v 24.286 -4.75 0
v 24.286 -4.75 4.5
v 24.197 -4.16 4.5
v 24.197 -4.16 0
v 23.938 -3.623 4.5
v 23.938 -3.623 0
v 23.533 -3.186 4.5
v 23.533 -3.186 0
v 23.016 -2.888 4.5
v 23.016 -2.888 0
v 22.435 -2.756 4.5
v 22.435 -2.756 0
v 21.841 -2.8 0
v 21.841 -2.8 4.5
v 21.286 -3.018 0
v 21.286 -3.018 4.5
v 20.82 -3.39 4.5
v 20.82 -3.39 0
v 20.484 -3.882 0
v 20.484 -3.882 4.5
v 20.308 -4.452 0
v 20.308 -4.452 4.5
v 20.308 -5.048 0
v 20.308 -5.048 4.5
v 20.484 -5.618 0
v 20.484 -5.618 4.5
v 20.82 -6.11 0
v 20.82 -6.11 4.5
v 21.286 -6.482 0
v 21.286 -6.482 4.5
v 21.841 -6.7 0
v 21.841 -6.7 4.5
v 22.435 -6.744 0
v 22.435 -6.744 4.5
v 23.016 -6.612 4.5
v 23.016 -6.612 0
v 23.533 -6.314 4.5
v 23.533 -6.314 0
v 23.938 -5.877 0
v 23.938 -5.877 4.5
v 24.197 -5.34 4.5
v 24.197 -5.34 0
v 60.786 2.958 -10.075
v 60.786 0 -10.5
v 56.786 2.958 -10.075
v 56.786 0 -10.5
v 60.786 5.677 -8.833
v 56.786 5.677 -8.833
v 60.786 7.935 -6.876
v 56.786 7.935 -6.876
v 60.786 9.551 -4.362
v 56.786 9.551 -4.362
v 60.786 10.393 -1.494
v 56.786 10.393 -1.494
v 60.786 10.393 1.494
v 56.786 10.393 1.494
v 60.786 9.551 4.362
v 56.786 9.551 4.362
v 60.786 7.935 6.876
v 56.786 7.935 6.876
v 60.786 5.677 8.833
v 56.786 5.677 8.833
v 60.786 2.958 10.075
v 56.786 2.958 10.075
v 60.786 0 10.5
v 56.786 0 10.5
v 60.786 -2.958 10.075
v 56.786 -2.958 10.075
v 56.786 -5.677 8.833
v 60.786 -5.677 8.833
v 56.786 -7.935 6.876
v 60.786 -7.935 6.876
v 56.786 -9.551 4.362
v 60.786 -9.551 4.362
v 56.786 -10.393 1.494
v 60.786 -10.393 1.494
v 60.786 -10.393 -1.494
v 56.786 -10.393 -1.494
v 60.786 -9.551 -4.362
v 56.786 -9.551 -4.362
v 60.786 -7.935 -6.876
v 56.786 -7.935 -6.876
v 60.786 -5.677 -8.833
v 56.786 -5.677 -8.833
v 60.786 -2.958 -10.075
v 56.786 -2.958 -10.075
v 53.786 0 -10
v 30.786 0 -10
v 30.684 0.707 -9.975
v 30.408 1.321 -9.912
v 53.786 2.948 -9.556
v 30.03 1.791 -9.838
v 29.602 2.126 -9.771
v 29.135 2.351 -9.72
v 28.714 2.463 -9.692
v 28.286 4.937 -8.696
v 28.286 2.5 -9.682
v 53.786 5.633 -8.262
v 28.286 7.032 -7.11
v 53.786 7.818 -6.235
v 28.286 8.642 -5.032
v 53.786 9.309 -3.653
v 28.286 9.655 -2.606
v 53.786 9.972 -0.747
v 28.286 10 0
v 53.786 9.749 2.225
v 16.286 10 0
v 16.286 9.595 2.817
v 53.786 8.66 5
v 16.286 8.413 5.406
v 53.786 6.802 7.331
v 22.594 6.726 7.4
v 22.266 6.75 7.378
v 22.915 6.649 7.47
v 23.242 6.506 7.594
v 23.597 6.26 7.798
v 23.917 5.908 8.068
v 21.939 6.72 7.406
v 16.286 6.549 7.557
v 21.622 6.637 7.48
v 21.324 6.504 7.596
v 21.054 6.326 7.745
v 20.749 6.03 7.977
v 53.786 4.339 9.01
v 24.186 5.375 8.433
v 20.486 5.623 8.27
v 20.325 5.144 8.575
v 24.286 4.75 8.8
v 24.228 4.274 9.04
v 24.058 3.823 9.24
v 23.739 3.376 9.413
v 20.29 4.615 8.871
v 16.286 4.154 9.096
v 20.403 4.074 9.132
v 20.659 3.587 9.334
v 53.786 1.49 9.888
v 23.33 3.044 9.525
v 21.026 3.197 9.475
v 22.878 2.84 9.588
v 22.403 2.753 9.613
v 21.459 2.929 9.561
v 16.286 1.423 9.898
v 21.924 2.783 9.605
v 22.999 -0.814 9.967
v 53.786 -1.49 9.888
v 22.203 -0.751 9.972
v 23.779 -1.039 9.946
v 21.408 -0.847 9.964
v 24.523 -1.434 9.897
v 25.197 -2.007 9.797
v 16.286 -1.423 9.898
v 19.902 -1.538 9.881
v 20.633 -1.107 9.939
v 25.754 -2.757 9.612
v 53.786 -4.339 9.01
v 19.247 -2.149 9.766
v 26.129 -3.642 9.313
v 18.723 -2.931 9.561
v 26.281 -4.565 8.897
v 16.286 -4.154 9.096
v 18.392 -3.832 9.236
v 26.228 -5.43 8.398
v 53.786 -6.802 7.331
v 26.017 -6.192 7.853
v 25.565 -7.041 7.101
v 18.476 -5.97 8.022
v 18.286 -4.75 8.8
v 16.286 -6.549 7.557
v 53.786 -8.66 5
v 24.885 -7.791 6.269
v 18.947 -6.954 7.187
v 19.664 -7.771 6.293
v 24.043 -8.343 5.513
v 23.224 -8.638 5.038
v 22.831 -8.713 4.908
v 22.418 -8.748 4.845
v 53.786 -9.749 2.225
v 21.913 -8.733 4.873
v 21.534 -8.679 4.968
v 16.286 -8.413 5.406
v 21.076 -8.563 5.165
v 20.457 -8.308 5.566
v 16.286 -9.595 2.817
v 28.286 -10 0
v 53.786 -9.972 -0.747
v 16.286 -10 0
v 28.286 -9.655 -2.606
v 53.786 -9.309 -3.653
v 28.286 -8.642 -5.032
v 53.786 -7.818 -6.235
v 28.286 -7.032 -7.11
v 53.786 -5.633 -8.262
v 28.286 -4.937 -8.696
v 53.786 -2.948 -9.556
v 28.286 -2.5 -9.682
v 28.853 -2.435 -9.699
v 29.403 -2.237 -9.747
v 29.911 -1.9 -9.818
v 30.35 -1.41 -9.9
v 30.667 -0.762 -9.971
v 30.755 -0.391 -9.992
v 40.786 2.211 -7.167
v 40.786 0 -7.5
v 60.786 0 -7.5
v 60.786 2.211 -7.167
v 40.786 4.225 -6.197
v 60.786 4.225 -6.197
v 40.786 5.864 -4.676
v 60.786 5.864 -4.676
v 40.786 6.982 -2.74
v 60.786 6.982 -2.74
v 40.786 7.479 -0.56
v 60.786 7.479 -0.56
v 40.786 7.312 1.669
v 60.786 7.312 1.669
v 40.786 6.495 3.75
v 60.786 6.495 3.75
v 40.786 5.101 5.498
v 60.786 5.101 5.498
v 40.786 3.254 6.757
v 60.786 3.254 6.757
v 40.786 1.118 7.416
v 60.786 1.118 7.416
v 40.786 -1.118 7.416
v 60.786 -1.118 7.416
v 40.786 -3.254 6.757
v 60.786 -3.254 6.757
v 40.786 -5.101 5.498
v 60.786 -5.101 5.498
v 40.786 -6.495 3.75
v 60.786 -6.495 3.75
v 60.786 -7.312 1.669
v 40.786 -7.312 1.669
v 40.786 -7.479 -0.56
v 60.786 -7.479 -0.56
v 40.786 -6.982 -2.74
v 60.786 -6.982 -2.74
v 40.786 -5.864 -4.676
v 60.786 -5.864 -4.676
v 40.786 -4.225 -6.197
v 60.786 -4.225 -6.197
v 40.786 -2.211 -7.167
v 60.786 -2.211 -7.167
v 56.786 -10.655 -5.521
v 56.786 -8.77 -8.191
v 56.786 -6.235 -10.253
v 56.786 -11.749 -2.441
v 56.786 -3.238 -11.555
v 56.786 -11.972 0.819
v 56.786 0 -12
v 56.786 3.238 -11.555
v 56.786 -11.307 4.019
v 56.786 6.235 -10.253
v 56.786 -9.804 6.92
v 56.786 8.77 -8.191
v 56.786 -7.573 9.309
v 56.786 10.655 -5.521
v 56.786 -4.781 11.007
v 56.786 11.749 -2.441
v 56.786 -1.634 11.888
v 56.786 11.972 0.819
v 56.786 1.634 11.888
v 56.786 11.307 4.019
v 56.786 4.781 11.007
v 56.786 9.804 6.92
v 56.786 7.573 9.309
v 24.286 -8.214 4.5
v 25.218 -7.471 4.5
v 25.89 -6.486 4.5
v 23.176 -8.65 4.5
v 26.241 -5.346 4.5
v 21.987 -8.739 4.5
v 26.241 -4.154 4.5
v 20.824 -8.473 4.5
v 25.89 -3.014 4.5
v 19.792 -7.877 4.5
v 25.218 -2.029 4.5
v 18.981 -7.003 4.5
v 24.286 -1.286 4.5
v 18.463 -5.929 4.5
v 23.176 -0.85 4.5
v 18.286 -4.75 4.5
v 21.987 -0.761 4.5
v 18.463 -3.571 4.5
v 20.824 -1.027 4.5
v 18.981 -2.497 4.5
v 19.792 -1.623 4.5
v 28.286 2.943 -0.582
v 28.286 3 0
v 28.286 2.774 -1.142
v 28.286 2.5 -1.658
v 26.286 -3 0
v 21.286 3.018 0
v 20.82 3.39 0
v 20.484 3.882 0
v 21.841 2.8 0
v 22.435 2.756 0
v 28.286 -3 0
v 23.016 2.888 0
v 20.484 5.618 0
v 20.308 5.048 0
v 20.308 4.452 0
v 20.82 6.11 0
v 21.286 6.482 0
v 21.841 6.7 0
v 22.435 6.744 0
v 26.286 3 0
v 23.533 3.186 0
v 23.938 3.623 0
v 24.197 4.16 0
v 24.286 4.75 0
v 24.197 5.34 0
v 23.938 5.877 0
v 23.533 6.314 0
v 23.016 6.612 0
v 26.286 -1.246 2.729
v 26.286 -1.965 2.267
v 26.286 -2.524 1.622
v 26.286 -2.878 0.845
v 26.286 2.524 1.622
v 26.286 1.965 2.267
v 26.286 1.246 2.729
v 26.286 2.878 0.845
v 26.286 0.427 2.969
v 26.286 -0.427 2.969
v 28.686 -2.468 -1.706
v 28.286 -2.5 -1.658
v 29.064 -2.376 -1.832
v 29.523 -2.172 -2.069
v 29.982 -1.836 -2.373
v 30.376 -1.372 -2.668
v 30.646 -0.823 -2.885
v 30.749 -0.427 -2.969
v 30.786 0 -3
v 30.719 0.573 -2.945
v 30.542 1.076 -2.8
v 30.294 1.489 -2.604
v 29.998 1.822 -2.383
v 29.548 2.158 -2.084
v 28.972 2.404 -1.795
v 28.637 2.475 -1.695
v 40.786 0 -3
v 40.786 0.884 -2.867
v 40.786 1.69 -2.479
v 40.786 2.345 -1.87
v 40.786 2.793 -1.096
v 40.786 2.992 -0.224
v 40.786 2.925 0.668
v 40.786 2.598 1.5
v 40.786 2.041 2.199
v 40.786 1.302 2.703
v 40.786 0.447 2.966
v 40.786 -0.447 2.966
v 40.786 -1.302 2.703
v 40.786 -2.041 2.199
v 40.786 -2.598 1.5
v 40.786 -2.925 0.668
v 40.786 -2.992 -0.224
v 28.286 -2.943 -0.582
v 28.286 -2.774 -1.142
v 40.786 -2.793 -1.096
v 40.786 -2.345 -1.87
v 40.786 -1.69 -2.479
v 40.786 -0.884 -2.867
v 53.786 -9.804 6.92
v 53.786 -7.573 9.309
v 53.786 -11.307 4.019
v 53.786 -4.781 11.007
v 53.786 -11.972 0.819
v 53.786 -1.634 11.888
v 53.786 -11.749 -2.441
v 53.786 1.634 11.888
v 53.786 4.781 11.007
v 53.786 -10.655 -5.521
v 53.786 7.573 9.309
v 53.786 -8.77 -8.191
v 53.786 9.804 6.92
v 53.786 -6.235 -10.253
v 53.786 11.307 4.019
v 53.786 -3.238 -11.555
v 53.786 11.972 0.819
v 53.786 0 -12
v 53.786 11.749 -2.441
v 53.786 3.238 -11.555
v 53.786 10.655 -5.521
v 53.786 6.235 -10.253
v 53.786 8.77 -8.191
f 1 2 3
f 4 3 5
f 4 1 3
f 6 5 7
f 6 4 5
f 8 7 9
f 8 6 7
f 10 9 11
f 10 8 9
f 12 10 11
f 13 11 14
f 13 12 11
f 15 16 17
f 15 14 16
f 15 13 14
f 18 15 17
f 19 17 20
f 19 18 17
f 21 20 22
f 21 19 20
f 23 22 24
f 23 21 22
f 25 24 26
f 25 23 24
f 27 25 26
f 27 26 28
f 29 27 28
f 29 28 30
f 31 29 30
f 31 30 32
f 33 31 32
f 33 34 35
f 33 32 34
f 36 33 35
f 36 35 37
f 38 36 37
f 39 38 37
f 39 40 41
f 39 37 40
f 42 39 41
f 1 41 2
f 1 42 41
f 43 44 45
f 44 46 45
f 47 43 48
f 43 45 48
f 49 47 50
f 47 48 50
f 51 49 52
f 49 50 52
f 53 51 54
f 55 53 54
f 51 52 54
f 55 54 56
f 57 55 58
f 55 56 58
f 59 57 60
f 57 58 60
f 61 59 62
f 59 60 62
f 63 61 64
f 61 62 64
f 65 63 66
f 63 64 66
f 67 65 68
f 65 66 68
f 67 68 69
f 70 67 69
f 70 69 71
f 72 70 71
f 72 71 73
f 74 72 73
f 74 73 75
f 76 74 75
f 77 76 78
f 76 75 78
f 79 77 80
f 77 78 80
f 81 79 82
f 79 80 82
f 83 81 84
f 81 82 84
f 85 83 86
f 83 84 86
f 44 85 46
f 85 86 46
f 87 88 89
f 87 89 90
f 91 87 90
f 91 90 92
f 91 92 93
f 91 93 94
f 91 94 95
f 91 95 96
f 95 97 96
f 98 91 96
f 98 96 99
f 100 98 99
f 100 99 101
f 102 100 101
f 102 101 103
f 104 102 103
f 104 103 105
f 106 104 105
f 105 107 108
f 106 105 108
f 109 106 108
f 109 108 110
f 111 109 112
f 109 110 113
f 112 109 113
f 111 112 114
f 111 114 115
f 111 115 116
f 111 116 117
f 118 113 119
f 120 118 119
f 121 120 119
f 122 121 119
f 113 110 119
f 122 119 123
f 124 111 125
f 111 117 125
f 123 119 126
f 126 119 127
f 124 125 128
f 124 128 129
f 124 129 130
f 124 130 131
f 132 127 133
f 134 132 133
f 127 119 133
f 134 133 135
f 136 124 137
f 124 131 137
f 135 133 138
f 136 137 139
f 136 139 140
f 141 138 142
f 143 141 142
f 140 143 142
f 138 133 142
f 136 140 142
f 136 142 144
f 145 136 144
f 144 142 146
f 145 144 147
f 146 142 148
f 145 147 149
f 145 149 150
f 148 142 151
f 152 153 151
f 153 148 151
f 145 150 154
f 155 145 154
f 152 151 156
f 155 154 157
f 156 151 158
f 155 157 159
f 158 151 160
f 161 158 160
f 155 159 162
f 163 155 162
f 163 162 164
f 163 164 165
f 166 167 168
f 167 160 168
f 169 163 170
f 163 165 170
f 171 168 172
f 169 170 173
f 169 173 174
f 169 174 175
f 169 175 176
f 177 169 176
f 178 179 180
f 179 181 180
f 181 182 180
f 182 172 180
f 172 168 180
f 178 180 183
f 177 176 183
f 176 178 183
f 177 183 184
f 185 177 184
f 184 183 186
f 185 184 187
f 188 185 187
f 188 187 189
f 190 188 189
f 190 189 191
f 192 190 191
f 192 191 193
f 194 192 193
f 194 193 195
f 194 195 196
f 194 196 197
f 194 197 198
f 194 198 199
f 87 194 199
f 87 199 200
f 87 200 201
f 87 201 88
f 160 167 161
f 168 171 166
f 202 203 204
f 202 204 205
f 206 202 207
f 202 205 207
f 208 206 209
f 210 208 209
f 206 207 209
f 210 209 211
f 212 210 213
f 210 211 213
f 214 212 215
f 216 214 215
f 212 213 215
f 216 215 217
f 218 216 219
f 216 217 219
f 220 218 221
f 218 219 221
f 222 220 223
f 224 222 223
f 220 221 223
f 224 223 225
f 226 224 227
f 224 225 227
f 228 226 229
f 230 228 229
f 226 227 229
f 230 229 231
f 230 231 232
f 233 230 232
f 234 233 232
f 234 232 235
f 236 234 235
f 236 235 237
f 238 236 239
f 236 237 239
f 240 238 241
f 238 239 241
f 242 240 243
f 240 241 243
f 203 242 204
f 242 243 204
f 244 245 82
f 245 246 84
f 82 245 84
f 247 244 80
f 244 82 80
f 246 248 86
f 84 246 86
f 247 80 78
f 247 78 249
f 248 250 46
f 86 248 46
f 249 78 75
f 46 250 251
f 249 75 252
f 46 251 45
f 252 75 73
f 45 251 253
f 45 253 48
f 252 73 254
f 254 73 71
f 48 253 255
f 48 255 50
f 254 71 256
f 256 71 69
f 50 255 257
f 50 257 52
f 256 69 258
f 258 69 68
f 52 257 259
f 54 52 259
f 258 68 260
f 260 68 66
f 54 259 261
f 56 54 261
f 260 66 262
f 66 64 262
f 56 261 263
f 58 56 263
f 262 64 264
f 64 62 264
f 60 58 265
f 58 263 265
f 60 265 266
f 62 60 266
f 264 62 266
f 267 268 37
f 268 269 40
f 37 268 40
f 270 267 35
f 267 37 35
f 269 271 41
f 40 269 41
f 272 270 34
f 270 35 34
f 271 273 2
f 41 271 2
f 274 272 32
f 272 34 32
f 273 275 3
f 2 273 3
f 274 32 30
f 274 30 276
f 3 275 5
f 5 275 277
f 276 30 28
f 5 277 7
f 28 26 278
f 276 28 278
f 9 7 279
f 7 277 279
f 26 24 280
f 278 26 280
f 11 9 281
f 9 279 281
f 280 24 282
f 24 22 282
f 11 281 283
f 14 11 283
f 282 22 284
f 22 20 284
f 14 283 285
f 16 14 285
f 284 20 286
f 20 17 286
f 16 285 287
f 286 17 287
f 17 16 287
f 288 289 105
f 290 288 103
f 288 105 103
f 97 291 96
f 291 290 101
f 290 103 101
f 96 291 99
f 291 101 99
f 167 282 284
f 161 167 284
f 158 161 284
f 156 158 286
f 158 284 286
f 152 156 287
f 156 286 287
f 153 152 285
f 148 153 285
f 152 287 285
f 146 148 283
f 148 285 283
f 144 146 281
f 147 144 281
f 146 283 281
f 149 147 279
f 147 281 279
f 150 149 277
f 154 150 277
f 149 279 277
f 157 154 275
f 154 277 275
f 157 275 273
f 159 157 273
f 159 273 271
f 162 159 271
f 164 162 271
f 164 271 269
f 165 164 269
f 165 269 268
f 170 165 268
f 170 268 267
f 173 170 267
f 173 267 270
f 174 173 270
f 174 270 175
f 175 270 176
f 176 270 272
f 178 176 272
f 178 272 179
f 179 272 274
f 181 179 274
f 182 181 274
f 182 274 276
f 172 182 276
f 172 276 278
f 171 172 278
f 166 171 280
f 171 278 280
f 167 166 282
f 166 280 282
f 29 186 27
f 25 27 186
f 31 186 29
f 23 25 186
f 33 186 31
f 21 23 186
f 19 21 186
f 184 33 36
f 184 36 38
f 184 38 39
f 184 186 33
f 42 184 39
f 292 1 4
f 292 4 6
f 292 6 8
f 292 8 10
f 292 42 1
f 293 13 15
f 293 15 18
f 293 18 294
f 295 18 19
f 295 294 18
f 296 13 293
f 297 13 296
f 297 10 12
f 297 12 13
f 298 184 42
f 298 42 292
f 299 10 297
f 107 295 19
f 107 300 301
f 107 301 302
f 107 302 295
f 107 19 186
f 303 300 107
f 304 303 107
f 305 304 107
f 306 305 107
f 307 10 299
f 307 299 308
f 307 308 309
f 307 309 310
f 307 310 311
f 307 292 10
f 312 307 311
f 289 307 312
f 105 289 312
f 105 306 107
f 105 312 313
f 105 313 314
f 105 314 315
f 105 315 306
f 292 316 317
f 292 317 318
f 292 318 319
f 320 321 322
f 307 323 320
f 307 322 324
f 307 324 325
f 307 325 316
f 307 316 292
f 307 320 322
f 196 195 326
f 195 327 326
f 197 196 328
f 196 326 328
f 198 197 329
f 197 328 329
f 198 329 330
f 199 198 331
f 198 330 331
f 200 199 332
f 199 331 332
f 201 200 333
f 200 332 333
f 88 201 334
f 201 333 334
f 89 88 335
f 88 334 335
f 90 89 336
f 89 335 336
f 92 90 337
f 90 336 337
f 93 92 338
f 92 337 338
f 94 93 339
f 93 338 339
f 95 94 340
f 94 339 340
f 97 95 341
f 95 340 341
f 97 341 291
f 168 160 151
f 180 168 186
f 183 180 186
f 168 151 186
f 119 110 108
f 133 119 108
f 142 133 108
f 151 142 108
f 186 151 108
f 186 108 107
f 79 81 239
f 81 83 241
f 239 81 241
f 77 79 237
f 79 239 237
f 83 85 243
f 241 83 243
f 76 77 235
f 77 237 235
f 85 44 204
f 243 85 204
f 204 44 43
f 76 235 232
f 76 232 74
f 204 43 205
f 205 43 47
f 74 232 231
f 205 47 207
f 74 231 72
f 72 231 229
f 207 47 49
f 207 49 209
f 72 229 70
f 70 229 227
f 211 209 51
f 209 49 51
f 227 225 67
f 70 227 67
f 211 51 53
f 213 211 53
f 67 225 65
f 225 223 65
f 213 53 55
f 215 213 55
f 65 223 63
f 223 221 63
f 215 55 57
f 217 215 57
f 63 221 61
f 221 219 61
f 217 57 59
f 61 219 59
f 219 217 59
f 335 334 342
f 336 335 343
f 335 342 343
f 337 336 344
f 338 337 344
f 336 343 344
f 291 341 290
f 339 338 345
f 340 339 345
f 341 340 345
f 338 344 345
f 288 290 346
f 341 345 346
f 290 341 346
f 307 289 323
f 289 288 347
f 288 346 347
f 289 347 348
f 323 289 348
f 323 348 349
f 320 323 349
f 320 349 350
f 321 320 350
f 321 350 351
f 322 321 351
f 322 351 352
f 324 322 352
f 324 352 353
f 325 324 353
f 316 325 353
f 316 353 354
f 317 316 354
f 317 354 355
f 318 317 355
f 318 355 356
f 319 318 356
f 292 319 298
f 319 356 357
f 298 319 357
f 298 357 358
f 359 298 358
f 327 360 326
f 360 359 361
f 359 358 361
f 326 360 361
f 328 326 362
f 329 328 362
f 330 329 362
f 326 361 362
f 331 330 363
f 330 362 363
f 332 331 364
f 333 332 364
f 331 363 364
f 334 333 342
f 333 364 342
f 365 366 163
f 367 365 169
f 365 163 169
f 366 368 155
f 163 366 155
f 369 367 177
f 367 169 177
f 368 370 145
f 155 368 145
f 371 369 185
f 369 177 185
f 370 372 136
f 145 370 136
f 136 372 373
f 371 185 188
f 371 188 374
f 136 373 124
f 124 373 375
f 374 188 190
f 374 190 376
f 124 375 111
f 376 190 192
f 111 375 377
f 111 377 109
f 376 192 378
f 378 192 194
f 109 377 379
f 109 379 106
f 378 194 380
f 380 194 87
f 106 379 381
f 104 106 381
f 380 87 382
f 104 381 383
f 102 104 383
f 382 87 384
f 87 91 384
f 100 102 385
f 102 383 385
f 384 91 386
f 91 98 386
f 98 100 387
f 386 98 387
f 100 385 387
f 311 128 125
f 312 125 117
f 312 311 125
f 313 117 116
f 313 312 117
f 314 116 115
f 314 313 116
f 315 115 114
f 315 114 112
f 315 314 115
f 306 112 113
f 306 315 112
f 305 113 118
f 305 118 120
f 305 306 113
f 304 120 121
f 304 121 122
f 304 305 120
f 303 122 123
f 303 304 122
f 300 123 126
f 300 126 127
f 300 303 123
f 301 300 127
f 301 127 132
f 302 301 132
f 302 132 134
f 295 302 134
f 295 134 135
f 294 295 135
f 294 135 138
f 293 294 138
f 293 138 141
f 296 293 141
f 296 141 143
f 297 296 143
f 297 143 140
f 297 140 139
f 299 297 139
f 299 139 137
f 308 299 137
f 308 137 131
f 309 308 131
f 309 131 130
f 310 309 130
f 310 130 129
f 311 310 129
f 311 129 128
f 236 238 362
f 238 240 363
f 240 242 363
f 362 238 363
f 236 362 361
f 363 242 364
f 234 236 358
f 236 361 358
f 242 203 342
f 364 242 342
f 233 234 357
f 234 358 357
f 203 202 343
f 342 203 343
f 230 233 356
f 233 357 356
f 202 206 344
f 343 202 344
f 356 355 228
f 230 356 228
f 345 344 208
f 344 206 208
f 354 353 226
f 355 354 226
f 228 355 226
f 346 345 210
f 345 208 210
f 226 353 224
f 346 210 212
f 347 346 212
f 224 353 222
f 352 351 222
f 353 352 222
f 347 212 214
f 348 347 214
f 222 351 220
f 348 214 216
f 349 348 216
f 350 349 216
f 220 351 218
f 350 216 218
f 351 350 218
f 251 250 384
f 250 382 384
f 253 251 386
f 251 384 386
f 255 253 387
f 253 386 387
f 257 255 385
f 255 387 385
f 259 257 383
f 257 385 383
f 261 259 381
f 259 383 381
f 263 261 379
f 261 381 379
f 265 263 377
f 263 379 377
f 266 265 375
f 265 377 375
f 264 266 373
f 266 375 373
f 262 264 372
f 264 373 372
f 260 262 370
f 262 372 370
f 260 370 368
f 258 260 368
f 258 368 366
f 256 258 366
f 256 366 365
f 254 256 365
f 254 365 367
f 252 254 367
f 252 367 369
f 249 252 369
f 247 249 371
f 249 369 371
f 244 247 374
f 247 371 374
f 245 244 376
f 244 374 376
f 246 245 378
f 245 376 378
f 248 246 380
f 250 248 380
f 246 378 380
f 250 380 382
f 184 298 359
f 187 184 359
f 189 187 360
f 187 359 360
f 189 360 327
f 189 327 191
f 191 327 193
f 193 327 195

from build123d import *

# Parameters (mm, degrees)
DODANIE_WYCI_GNI_CIE1_DEPTH = 12
SZKIC3_R                    = 2
WYTNIJ_WYCI_GNI_CIE1_DEPTH  = 12
SZKIC6_R                    = 4
WYTNIJ_WYCI_GNI_CIE2_DEPTH  = 12
SZKIC7_R                    = 3
WYTNIJ_WYCI_GNI_CIE3_DEPTH  = 14.5
SZKIC9_R                    = 2.5
WYTNIJ_WYCI_GNI_CIE5_DEPTH  = 13


with BuildPart() as part:
    # Szkic1 → Obrót1 (revolve)
    with BuildSketch(Plane(origin=(0, 0, 0), x_dir=(1, 0, 0), z_dir=(0, 1, 0))):
        Polygon((28.285714286, 0), (40.785714286, 0), (40.785714286, 7.5), (60.785714286, 7.5), (60.785714286, 10.5), (56.785714286, 10.5), (56.785714286, 12), (53.785714286, 12), (53.785714286, 10), (28.285714286, 10), align=None)
    revolve(axis=Axis((28.285714286, 0, 0), (1, 0, 0)))

    # Szkic2 → Dodanie-wyciągnięcie1 (add)
    with BuildSketch(Plane.ZY.offset(-28.285714286)):
        with BuildLine():
            Line((0, -10), (0, 10))
            ThreePointArc((0, 10), (10, 0), (0, -10))
        make_face()
    extrude(amount=DODANIE_WYCI_GNI_CIE1_DEPTH)

    # Szkic3 → Wytnij-wyciągnięcie1 (cut)
    with BuildSketch(Plane.XY):
        with Locations((22.285714286, 4.75)):
            Circle(SZKIC3_R)
        with Locations((22.285714286, -4.75)):
            Circle(SZKIC3_R)
    extrude(amount=WYTNIJ_WYCI_GNI_CIE1_DEPTH, mode=Mode.SUBTRACT)

    # Szkic6 → Wytnij-wyciągnięcie2 (cut)
    with BuildSketch(Plane(origin=(0, 0, 4.5), x_dir=(-1, 0, 0), z_dir=(0, 0, -1))):
        with Locations((-22.285714286, -4.75)):
            Circle(SZKIC6_R)
    extrude(amount=-WYTNIJ_WYCI_GNI_CIE2_DEPTH, mode=Mode.SUBTRACT)

    # Szkic7 → Wytnij-wyciągnięcie3 (cut)
    with BuildSketch(Plane(origin=(40.785714286, 0, 0), x_dir=(0, 0, -1), z_dir=(1, 0, 0))):
        Circle(SZKIC7_R)
    extrude(amount=-WYTNIJ_WYCI_GNI_CIE3_DEPTH, mode=Mode.SUBTRACT)

    # Szkic9 → Wytnij-wyciągnięcie5 (cut, through all)
    with BuildSketch(Plane.XY):
        with Locations((28.285714286, 0)):
            Circle(SZKIC9_R)
    extrude(amount=-WYTNIJ_WYCI_GNI_CIE5_DEPTH, mode=Mode.SUBTRACT)


solid = part.part
